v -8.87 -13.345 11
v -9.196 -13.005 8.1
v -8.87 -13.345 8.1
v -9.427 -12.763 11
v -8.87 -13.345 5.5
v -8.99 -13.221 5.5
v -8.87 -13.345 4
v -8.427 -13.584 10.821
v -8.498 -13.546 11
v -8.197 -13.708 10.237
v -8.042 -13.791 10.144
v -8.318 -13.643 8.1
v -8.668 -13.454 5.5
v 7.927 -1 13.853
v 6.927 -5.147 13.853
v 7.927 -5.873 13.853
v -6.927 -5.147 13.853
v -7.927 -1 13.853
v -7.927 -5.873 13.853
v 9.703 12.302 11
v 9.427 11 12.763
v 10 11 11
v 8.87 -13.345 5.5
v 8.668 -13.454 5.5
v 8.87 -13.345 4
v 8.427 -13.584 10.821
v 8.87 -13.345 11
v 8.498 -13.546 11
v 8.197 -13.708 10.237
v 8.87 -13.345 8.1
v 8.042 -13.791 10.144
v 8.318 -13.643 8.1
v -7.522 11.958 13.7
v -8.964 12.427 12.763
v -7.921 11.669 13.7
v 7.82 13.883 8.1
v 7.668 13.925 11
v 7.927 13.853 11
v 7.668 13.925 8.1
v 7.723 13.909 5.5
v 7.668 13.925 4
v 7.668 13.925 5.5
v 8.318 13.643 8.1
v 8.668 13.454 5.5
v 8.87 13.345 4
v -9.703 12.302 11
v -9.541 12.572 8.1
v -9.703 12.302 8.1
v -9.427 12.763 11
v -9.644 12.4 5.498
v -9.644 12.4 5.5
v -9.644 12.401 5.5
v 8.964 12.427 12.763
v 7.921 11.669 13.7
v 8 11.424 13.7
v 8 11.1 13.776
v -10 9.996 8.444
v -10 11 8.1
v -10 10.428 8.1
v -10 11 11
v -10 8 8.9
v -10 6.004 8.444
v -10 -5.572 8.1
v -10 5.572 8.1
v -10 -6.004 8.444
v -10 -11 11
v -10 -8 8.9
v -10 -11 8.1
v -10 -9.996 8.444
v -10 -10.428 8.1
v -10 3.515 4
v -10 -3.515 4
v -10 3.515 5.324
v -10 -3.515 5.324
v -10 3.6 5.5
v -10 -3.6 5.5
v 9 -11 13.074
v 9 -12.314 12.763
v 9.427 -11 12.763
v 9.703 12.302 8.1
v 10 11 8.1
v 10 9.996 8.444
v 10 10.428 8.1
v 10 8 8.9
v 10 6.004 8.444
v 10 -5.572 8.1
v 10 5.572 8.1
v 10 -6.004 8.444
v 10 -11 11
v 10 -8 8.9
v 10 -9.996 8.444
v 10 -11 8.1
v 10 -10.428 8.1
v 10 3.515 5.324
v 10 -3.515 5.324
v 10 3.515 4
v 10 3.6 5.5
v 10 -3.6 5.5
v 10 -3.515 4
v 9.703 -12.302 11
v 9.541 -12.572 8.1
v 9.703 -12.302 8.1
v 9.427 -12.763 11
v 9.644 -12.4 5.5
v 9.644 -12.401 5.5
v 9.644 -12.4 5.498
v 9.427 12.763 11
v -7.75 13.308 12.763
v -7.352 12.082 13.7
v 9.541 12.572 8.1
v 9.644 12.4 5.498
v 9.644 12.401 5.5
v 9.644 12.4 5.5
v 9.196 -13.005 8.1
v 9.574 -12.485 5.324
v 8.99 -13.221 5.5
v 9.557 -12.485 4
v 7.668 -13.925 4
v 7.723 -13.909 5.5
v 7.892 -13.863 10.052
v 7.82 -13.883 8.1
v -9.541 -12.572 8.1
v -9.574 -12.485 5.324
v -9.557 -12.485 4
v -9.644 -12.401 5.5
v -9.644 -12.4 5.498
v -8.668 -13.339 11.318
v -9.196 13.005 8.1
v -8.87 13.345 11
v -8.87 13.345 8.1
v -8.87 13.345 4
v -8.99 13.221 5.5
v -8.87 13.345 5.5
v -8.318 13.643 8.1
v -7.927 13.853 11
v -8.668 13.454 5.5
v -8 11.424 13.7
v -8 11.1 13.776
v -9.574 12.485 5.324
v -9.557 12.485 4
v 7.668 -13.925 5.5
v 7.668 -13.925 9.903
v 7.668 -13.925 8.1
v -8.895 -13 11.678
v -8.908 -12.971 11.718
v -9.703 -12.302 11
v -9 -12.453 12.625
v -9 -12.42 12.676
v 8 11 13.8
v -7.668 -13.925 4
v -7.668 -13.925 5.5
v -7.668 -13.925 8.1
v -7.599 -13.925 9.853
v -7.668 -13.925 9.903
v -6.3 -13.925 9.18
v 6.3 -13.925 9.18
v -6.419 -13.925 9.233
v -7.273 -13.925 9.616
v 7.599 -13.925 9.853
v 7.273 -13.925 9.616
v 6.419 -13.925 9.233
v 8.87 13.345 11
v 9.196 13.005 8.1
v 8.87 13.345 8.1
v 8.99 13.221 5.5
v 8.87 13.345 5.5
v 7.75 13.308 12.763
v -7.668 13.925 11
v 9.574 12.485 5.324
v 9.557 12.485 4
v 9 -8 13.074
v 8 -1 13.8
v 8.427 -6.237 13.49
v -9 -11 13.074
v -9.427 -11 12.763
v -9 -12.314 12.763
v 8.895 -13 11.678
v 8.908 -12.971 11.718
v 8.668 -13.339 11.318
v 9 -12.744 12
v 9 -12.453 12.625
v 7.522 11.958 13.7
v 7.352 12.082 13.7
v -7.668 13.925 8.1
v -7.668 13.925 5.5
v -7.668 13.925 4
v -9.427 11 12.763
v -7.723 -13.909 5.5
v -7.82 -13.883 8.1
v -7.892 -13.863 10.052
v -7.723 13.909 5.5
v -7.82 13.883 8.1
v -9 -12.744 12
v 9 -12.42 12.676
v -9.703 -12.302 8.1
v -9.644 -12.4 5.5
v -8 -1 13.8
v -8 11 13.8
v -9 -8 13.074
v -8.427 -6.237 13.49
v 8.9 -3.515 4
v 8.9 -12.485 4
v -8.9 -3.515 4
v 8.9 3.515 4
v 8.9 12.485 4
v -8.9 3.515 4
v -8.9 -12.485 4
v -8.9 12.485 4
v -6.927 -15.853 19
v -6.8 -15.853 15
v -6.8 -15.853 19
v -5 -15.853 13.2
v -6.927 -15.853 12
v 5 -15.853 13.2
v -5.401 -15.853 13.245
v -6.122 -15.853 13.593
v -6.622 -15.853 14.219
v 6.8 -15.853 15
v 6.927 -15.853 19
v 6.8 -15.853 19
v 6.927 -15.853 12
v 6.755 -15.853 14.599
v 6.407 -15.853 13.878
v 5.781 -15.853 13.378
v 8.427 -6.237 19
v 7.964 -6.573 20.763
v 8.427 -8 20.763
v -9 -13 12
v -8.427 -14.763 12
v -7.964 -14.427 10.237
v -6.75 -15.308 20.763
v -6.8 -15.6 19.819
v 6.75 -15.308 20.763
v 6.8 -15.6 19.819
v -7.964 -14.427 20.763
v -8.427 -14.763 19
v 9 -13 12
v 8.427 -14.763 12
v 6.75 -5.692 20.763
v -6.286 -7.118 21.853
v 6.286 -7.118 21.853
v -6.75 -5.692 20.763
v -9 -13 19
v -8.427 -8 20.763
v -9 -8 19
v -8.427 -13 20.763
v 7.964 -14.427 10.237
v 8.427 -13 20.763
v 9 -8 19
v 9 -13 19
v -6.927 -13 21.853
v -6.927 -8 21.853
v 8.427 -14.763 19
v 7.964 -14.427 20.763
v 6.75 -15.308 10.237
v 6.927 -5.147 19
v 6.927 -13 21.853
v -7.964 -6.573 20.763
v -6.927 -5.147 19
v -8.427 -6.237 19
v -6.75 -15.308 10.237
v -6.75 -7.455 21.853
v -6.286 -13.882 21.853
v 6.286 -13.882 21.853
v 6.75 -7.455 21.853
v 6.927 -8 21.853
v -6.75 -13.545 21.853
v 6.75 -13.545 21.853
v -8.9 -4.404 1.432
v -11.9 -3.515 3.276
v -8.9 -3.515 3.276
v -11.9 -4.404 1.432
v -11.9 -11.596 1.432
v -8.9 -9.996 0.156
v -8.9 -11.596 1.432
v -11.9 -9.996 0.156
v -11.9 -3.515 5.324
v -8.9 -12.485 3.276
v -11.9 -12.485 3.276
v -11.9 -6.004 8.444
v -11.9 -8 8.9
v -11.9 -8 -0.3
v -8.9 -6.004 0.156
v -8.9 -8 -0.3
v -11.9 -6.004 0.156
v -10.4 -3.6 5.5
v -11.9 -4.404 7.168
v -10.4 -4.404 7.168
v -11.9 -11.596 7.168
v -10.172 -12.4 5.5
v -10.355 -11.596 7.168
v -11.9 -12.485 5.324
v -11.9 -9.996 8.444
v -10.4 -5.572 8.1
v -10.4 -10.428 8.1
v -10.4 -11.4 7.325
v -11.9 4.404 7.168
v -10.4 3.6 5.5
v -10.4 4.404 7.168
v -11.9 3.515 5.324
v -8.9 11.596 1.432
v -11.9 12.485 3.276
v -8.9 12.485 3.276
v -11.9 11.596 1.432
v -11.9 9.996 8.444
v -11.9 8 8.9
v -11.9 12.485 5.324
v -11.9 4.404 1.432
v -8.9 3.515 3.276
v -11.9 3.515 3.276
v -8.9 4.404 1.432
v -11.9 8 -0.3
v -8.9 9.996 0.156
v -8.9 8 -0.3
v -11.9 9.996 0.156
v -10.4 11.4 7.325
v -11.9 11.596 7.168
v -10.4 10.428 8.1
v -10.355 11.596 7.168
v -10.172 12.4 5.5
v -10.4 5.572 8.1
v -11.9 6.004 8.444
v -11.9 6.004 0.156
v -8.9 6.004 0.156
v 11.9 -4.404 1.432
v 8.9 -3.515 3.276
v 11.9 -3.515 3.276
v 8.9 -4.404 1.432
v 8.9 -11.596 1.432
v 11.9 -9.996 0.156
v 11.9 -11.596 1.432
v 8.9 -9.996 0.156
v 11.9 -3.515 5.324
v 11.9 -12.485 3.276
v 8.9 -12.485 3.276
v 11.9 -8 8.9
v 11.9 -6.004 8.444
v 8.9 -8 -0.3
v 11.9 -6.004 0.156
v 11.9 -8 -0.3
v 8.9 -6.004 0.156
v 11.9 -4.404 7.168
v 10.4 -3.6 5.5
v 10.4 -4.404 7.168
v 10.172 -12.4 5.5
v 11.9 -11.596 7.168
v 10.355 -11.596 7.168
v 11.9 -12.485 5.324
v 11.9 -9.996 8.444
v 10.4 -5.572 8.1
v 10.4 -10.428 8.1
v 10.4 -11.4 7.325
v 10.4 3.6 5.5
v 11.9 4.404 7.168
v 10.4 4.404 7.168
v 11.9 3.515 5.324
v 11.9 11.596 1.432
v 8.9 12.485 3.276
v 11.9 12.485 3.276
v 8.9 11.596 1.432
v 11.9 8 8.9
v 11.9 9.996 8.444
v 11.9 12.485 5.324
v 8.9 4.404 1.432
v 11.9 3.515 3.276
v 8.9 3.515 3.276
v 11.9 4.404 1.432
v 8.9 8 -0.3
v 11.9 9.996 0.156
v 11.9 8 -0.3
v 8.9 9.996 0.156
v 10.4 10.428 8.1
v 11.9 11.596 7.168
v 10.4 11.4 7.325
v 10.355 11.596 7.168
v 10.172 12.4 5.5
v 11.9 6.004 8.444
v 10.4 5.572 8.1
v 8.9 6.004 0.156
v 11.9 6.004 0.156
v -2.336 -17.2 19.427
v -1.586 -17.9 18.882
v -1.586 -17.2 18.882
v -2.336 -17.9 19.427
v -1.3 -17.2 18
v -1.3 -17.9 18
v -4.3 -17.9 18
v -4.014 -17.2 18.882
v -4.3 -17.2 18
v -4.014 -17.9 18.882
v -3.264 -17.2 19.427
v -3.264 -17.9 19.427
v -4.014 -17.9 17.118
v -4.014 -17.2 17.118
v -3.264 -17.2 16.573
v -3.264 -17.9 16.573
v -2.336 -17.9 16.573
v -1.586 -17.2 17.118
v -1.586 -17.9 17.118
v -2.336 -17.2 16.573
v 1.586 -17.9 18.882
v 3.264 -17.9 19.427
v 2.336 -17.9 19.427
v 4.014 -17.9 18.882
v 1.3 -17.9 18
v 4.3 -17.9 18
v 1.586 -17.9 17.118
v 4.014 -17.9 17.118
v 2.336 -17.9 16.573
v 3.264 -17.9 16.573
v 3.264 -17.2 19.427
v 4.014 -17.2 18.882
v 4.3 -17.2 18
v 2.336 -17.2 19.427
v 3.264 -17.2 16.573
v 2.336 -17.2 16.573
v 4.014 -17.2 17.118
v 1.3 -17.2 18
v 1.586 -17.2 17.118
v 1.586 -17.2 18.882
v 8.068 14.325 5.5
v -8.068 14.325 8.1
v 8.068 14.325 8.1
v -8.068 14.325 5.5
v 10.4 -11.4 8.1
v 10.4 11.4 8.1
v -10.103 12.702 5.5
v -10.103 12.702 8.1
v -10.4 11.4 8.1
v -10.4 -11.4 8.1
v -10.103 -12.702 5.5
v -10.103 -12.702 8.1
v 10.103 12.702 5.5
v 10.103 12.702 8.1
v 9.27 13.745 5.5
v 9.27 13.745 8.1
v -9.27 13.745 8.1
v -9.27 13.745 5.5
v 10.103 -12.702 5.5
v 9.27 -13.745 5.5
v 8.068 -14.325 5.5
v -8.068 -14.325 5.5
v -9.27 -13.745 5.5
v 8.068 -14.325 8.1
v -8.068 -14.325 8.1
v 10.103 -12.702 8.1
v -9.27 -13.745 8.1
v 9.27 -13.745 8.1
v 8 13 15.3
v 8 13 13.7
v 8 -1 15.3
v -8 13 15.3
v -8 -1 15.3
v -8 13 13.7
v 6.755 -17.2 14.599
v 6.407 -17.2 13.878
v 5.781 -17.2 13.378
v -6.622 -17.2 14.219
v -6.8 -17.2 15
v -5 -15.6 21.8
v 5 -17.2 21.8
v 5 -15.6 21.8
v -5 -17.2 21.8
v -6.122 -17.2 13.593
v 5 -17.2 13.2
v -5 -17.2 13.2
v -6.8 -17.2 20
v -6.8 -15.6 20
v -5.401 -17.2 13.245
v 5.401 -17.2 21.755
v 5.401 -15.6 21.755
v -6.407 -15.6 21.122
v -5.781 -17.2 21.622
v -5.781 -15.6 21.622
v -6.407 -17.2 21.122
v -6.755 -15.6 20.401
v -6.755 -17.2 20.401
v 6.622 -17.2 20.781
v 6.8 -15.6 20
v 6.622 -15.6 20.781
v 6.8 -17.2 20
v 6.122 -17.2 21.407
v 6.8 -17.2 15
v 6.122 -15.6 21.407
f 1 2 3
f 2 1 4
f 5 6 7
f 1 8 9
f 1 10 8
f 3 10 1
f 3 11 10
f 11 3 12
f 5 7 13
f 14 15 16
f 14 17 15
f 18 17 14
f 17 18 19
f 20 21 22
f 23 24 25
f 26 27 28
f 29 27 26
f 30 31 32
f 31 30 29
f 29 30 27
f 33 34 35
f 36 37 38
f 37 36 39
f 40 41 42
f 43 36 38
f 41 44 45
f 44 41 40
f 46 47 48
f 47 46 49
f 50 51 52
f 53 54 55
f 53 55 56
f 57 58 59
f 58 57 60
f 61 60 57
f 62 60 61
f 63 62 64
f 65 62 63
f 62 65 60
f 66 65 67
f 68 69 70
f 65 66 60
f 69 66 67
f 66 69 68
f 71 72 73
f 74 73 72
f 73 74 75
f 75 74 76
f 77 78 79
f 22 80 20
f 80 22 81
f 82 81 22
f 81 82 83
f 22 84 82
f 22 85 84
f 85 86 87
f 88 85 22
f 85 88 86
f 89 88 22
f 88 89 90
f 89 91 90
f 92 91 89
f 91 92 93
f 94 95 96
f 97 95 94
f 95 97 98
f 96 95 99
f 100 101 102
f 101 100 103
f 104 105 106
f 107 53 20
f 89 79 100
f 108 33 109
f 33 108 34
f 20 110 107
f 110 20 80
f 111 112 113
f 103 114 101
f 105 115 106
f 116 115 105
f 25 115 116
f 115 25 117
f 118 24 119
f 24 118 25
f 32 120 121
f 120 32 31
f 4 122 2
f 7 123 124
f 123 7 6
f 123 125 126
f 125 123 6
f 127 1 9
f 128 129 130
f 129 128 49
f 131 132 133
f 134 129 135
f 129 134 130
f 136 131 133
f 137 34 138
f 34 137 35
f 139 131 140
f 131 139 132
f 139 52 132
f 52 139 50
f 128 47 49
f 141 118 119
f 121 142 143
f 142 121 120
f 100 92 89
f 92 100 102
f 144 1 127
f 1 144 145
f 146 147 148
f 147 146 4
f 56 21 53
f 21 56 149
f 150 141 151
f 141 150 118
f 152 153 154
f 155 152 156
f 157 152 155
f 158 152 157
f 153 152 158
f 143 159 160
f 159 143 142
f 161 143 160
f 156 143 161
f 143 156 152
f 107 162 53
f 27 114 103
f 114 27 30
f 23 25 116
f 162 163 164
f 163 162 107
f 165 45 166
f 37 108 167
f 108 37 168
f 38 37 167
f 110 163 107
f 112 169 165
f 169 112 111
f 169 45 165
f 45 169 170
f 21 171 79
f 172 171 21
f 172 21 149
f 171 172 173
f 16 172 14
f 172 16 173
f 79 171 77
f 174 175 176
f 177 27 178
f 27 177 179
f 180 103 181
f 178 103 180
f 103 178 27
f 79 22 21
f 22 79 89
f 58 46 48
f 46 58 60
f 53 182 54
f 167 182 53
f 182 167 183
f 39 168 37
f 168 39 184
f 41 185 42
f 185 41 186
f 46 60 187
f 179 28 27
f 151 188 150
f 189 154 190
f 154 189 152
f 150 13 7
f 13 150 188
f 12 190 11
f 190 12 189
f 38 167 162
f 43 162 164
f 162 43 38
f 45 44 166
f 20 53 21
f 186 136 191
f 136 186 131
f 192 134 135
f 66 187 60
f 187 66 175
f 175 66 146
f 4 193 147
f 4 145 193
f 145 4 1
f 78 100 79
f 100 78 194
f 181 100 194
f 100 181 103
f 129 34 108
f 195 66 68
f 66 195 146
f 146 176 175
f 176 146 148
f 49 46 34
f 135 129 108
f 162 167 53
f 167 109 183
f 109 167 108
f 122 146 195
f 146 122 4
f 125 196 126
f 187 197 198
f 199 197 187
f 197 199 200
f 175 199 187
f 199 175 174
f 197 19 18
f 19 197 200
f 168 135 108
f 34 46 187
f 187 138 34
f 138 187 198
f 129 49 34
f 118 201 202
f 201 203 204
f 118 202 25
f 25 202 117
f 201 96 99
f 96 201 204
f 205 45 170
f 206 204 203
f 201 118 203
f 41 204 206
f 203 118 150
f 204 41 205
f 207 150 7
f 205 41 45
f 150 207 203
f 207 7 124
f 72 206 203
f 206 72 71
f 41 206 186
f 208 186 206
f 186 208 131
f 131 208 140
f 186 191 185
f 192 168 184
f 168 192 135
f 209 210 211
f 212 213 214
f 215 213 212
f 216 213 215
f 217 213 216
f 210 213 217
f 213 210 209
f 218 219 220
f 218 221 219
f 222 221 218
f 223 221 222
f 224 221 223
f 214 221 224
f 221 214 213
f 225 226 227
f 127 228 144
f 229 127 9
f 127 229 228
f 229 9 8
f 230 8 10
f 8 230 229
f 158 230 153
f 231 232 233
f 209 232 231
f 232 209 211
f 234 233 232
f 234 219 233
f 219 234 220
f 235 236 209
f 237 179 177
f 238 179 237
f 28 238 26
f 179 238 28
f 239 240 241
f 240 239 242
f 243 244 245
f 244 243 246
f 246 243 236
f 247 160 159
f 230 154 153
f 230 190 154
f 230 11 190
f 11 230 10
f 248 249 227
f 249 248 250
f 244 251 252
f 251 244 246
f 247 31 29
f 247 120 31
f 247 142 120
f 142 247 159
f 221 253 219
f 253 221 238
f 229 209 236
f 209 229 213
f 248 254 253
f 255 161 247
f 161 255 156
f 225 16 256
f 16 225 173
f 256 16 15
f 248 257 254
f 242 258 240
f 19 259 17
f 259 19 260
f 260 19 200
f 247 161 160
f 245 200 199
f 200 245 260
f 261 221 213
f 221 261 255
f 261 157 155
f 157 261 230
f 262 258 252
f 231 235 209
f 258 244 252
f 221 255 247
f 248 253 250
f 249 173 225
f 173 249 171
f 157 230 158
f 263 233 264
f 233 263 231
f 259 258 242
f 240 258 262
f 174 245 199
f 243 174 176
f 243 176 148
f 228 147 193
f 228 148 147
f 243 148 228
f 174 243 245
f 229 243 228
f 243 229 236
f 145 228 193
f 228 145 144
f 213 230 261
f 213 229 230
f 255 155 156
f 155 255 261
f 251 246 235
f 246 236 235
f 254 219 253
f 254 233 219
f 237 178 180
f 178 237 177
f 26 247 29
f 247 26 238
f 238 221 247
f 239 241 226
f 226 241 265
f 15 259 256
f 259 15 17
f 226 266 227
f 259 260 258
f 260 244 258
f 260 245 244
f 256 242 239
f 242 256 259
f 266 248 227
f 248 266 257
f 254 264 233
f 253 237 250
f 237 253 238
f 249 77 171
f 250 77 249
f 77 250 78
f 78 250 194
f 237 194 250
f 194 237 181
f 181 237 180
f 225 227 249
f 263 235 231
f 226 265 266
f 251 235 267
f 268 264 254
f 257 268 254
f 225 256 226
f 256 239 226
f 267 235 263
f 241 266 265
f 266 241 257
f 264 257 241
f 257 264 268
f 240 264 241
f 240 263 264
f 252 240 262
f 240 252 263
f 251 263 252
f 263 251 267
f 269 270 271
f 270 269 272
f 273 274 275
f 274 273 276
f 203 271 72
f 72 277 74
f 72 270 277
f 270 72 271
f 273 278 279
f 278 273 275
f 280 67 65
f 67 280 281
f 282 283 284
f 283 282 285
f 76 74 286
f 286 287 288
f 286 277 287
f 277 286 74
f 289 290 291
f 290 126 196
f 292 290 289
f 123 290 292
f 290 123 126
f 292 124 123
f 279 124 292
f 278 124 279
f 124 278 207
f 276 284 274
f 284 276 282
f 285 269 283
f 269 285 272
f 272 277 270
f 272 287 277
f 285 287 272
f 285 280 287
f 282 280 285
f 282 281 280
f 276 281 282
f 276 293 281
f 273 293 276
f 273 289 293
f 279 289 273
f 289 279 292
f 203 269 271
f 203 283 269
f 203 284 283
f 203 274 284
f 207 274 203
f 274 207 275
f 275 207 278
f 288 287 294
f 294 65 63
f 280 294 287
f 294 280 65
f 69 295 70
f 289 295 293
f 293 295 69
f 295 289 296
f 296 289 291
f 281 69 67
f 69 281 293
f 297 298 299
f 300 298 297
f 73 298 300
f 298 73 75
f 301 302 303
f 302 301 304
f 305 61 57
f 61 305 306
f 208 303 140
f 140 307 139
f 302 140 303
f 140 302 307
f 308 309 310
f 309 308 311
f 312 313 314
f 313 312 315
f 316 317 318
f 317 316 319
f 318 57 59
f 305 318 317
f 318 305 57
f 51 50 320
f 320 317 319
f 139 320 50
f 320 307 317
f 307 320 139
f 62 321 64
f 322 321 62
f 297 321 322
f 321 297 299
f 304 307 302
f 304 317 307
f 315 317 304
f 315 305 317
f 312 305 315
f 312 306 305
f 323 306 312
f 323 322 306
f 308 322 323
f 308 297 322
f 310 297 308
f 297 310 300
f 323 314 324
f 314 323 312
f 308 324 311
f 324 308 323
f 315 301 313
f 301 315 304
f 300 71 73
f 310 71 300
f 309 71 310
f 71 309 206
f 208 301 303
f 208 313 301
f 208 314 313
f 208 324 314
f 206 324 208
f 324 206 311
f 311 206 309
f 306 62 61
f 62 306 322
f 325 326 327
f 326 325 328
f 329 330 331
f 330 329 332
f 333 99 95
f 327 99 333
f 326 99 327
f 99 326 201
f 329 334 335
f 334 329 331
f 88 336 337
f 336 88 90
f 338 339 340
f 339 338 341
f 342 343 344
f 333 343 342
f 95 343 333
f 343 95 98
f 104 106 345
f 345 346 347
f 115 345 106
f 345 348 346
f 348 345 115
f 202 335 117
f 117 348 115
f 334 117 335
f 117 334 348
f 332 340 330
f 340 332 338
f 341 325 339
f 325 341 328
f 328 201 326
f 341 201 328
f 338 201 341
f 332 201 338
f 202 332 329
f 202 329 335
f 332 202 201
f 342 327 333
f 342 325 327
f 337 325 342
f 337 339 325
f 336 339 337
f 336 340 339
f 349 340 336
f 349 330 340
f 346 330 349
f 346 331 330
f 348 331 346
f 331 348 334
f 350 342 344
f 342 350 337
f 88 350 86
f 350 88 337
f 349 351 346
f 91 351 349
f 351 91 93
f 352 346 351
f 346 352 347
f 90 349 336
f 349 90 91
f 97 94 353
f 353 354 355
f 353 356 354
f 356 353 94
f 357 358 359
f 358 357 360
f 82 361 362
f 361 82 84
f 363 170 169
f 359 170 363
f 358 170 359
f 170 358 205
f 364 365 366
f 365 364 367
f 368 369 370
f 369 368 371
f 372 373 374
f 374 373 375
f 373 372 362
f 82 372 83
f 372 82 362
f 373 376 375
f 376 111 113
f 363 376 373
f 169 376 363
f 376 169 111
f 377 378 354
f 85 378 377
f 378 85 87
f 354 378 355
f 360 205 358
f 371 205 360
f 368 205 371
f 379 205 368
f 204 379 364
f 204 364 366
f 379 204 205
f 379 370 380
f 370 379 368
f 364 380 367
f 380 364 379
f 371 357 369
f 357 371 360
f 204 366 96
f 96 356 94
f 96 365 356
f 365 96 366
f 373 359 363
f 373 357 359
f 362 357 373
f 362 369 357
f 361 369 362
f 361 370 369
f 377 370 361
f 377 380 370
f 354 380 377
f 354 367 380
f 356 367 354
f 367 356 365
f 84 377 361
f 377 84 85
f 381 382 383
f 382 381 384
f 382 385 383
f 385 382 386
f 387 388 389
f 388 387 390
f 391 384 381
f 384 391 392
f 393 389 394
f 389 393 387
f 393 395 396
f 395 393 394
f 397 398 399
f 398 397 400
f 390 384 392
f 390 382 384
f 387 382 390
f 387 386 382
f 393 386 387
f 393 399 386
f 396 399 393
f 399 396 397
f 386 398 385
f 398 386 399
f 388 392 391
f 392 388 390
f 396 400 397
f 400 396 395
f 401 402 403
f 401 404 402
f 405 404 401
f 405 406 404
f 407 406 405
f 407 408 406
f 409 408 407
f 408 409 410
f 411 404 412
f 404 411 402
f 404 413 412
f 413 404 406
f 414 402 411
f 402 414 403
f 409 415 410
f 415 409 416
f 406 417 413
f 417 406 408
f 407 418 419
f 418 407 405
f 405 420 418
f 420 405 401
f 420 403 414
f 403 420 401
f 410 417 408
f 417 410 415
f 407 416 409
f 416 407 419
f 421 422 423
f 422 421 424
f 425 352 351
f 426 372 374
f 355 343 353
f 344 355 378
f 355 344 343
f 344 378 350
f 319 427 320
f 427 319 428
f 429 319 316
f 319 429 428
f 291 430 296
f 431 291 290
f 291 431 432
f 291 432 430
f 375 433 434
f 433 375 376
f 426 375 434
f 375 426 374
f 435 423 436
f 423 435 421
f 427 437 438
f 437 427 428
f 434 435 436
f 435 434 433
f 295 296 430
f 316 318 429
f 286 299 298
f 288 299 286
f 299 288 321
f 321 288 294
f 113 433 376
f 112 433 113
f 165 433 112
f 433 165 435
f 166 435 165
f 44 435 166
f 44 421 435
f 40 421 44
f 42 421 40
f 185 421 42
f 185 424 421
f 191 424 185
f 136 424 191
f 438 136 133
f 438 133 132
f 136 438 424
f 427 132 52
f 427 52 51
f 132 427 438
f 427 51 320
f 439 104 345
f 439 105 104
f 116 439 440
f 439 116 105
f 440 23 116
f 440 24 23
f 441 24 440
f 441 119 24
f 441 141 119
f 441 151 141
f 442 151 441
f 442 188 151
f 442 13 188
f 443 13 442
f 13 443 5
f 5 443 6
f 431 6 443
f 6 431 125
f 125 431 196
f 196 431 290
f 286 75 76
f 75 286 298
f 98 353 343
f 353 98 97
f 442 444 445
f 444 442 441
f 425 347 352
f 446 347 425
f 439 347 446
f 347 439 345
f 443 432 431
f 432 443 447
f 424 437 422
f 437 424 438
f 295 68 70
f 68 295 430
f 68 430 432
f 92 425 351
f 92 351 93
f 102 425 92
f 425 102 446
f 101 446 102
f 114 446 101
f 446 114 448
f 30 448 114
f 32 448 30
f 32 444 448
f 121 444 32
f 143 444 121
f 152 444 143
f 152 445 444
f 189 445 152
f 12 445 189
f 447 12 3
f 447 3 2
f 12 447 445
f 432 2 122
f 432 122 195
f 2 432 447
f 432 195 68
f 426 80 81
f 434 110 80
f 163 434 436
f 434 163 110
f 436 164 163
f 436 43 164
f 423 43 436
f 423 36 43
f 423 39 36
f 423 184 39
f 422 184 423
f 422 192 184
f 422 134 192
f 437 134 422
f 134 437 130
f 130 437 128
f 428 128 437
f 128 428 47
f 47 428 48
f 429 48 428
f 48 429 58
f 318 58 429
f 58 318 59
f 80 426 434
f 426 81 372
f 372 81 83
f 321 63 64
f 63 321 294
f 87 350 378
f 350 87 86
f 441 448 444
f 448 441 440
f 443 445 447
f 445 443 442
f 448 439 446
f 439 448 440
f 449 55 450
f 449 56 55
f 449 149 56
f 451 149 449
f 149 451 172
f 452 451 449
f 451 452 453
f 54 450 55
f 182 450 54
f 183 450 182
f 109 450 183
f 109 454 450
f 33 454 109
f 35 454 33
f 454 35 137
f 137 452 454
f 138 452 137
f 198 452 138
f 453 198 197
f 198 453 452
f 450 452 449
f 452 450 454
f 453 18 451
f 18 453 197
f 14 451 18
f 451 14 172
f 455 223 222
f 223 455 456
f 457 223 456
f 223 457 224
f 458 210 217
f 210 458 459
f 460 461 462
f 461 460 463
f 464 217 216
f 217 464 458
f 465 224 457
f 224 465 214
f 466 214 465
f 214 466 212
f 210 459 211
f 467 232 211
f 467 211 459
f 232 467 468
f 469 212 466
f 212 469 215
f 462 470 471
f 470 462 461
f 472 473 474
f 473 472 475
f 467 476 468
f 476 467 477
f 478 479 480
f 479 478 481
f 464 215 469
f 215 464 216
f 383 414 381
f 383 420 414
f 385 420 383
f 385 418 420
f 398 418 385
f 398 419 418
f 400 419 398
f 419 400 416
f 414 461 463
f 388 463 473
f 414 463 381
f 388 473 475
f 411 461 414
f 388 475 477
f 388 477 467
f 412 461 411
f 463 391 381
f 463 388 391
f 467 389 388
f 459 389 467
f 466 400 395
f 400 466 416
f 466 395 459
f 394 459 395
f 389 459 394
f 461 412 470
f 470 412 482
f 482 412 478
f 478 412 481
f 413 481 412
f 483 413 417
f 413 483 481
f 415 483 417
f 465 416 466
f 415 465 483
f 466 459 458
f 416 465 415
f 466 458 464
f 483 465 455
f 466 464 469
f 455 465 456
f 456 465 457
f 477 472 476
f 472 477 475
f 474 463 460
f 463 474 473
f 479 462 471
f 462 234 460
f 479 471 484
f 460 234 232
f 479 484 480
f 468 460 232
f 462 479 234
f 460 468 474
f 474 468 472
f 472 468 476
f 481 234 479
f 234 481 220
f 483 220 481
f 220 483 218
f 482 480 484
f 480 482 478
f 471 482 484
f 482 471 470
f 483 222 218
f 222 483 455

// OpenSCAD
// Kiuê — carrinho-robô (tema entregas), v1. Um por worker, posto e animado pelo jogo.
// Origem no chão, no centro; frente em −Y (no jogo, +z: de frente para a câmera). 32 × 20 mm.
// Partes: corpo (claro), parachoque (cor do serviço), rodas (escuro), cacamba (metal),
// visor (escuro), olhos (acesos).
parte = "tudo";
PARTES = ["corpo", "parachoque", "rodas", "cacamba", "visor", "olhos"];
$fn = 14;

module peca(n) {
    if (n == "corpo") {
        hull() for (sx = [-1, 1], sy = [-1, 1]) translate([sx * 7, sy * 11, 4]) { cylinder(r = 3, h = 7); translate([0, 0, 7]) sphere(r = 3, $fn = 10); }
        // cabine com o rosto, na frente
        hull() for (sx = [-1, 1], sy = [0, 1]) translate([sx * 6, -8 - sy * 5, 12]) { sphere(r = 3, $fn = 10); translate([0, 0, 7]) sphere(r = 3, $fn = 10); }
    } else if (n == "parachoque") {
        translate([0, 0, 5.5]) hull() for (sx = [-1, 1], sy = [-1, 1]) translate([sx * 7.4, sy * 11.4, 0]) cylinder(r = 3, h = 2.6);
    } else if (n == "rodas") {
        for (sx = [-1, 1], sy = [-1, 1]) translate([sx * 10.4, sy * 8, 4.3]) rotate([0, 90, 0]) cylinder(r = 4.6, h = 3, center = true);
    } else if (n == "cacamba") {
        translate([-8, -1, 13.7]) cube([16, 14, 1.6]);
    } else if (n == "visor") {
        translate([0, -15.6, 17.5]) rotate([90, 0, 0]) linear_extrude(1.6) offset(r = 1.8) square([10, 5], center = true);
    } else if (n == "olhos") {
        for (s = [-1, 1]) translate([s * 2.8, -17, 18]) rotate([90, 0, 0]) cylinder(r = 1.5, h = 0.9, $fn = 10);
    }
}
if (parte == "tudo") { union() for (p = PARTES) peca(p); } else peca(parte);
